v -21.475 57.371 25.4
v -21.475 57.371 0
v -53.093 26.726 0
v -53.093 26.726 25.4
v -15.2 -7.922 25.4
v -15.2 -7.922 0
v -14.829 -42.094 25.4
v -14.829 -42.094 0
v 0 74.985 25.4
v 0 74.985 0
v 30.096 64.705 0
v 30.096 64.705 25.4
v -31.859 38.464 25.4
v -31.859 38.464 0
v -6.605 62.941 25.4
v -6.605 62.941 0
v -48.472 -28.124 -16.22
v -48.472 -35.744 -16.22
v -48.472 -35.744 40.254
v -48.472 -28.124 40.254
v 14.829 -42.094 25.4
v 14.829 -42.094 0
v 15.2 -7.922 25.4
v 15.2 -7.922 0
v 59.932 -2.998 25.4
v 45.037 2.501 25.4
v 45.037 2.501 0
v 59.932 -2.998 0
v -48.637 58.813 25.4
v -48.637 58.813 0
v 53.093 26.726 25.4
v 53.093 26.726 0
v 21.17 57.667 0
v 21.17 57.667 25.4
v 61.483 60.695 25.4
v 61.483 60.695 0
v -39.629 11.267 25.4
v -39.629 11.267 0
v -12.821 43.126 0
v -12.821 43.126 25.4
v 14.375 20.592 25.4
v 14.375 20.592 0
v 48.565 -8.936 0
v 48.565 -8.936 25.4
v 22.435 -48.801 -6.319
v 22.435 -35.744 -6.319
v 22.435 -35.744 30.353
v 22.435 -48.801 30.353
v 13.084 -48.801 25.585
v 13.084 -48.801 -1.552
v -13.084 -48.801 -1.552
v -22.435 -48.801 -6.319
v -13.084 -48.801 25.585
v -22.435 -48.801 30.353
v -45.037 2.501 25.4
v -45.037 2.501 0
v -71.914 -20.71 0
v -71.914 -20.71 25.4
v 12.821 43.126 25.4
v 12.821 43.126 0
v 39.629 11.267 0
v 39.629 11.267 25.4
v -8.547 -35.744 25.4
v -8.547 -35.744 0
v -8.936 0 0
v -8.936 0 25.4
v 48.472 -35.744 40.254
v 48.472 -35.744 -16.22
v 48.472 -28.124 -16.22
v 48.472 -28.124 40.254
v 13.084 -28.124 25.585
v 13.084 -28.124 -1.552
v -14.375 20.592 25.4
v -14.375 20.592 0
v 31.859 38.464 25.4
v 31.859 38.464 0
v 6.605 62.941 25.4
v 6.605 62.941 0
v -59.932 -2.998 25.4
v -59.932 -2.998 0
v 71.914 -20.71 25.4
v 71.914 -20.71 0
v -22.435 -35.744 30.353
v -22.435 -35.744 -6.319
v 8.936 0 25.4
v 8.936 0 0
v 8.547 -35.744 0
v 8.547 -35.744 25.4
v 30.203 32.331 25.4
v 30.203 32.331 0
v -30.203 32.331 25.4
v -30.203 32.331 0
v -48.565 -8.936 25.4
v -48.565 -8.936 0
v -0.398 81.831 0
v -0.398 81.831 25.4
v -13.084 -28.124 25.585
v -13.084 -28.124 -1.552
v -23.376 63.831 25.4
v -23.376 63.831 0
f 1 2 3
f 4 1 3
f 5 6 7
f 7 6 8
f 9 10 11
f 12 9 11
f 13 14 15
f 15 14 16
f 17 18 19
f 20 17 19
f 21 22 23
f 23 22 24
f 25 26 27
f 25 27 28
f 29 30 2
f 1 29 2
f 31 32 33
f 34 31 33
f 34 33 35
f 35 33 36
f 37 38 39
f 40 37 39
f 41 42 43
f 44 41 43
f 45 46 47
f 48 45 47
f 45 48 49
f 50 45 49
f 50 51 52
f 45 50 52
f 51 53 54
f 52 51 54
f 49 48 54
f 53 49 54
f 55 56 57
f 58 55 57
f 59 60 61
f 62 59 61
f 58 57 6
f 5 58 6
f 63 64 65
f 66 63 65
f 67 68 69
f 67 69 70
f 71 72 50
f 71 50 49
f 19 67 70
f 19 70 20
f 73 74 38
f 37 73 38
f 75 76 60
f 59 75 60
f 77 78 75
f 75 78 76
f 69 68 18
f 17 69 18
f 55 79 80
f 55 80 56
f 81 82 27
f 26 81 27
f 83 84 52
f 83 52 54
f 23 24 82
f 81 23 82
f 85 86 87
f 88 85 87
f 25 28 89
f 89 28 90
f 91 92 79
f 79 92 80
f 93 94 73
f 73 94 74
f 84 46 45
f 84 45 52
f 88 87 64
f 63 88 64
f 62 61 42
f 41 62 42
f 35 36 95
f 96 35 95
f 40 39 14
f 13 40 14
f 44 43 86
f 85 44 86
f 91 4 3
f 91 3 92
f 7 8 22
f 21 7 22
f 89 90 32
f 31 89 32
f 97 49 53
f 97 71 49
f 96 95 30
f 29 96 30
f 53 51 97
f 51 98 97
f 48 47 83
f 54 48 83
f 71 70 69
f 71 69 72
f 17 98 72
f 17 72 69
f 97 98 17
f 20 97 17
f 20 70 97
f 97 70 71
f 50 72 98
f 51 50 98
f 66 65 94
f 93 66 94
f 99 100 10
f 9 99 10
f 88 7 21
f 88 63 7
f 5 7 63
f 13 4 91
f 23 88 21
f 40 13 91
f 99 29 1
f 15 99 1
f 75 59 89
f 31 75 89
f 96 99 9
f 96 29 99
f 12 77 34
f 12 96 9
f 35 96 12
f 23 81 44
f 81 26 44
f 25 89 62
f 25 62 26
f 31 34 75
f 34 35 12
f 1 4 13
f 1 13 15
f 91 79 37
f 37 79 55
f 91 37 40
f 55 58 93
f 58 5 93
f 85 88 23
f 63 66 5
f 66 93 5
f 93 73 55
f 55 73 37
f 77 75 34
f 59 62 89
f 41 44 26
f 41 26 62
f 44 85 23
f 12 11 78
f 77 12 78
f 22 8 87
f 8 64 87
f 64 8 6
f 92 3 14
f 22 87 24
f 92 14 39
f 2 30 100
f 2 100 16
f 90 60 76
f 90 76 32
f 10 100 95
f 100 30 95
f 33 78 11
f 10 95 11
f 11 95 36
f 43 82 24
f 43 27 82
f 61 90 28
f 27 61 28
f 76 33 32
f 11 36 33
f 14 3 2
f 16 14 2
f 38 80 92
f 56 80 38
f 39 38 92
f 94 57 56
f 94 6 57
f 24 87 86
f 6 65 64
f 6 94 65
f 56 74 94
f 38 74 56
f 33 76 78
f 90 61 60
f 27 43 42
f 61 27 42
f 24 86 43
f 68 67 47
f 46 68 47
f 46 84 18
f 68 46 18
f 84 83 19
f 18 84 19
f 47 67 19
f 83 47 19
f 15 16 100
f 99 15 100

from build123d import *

# Parameters (mm, degrees)
F1_DEPTH = 25.4
F2_W     = 96.9438627362
F2_H     = 56.4742647111
F2_W_2   = 44.8701865971
F2_H_2   = 36.6715993732
F2_W_3   = 26.1676702648
F2_H_3   = 27.1369842812
F3_DEPTH = 7.62
F4_DEPTH = 13.05744


with BuildPart() as f1:
    # F0 (on Top) → F1 (new body)
    with BuildSketch(Plane.XY):
        Polygon((-15.2002724628, -7.9219630817), (-14.8288337448, -42.0940224084), (0, -42.0940224084), (14.8288337448, -42.0940224084), (15.2002724628, -7.9219630817), (71.9137688096, -20.7102910067), (45.0371085278, 2.5013713437), (59.9321083919, -2.9983216828), (30.2034030994, 32.3314461975), (53.0932784976, 26.7257584044), (21.1701166571, 57.6666764014), (61.4833603316, 60.6945607437), (-0.3977347554, 81.830812644), (-48.6371593785, 58.8133267539), (-21.4750114589, 57.3711629086), (-53.0932784976, 26.7257584044), (-30.2034030994, 32.3314461975), (-59.9321083919, -2.9983216828), (-45.0371085278, 2.5013713437), (-71.9137688096, -20.7102910067), align=None)
        Polygon((8.5474811494, -35.744022578), (0, -35.744022578), (-8.5474811494, -35.744022578), (-8.9360065758, 0), (-48.5652536154, -8.9360000566), (-14.3753122538, 20.5916780978), (-39.6292470396, 11.267147027), (-12.8212254494, 43.1259572506), (-31.858805567, 38.4636893868), (-6.6048740409, 62.940582633), (-23.3757123351, 63.8310238719), (0, 74.9847665429), (30.0963129848, 64.7049993277), (6.6048740409, 62.940582633), (31.858805567, 38.4636893868), (12.8212254494, 43.1259572506), (39.6292470396, 11.267147027), (14.3753122538, 20.5916780978), (48.5652536154, -8.9360000566), (8.9360065758, 0), align=None, mode=Mode.SUBTRACT)
    extrude(amount=F1_DEPTH)


with BuildPart() as f3:
    # F2 (on face) → F3 (new body)
    with BuildSketch(Plane(origin=(0, -35.744022578, 0), x_dir=(-1, 0, 0), z_dir=(0, 1, 0))):
        with Locations((0, 12.0169725269)):
            Rectangle(F2_W, F2_H)
        with Locations((0, 12.0169725269)):
            Rectangle(F2_W_2, F2_H_2, mode=Mode.SUBTRACT)
        with Locations((0, 12.0169725269)):
            Rectangle(F2_W_2, F2_H_2)
        with Locations((0, 12.0169725269)):
            Rectangle(F2_W_3, F2_H_3, mode=Mode.SUBTRACT)
    extrude(amount=F3_DEPTH)

    # F2 (on face) → F4 (join)
    with BuildSketch(Plane(origin=(0, -35.744022578, 0), x_dir=(-1, 0, 0), z_dir=(0, 1, 0))):
        with Locations((0, 12.0169725269)):
            Rectangle(F2_W_2, F2_H_2)
        with Locations((0, 12.0169725269)):
            Rectangle(F2_W_3, F2_H_3, mode=Mode.SUBTRACT)
    extrude(amount=-F4_DEPTH)


solid = Compound([f1.part, f3.part])
